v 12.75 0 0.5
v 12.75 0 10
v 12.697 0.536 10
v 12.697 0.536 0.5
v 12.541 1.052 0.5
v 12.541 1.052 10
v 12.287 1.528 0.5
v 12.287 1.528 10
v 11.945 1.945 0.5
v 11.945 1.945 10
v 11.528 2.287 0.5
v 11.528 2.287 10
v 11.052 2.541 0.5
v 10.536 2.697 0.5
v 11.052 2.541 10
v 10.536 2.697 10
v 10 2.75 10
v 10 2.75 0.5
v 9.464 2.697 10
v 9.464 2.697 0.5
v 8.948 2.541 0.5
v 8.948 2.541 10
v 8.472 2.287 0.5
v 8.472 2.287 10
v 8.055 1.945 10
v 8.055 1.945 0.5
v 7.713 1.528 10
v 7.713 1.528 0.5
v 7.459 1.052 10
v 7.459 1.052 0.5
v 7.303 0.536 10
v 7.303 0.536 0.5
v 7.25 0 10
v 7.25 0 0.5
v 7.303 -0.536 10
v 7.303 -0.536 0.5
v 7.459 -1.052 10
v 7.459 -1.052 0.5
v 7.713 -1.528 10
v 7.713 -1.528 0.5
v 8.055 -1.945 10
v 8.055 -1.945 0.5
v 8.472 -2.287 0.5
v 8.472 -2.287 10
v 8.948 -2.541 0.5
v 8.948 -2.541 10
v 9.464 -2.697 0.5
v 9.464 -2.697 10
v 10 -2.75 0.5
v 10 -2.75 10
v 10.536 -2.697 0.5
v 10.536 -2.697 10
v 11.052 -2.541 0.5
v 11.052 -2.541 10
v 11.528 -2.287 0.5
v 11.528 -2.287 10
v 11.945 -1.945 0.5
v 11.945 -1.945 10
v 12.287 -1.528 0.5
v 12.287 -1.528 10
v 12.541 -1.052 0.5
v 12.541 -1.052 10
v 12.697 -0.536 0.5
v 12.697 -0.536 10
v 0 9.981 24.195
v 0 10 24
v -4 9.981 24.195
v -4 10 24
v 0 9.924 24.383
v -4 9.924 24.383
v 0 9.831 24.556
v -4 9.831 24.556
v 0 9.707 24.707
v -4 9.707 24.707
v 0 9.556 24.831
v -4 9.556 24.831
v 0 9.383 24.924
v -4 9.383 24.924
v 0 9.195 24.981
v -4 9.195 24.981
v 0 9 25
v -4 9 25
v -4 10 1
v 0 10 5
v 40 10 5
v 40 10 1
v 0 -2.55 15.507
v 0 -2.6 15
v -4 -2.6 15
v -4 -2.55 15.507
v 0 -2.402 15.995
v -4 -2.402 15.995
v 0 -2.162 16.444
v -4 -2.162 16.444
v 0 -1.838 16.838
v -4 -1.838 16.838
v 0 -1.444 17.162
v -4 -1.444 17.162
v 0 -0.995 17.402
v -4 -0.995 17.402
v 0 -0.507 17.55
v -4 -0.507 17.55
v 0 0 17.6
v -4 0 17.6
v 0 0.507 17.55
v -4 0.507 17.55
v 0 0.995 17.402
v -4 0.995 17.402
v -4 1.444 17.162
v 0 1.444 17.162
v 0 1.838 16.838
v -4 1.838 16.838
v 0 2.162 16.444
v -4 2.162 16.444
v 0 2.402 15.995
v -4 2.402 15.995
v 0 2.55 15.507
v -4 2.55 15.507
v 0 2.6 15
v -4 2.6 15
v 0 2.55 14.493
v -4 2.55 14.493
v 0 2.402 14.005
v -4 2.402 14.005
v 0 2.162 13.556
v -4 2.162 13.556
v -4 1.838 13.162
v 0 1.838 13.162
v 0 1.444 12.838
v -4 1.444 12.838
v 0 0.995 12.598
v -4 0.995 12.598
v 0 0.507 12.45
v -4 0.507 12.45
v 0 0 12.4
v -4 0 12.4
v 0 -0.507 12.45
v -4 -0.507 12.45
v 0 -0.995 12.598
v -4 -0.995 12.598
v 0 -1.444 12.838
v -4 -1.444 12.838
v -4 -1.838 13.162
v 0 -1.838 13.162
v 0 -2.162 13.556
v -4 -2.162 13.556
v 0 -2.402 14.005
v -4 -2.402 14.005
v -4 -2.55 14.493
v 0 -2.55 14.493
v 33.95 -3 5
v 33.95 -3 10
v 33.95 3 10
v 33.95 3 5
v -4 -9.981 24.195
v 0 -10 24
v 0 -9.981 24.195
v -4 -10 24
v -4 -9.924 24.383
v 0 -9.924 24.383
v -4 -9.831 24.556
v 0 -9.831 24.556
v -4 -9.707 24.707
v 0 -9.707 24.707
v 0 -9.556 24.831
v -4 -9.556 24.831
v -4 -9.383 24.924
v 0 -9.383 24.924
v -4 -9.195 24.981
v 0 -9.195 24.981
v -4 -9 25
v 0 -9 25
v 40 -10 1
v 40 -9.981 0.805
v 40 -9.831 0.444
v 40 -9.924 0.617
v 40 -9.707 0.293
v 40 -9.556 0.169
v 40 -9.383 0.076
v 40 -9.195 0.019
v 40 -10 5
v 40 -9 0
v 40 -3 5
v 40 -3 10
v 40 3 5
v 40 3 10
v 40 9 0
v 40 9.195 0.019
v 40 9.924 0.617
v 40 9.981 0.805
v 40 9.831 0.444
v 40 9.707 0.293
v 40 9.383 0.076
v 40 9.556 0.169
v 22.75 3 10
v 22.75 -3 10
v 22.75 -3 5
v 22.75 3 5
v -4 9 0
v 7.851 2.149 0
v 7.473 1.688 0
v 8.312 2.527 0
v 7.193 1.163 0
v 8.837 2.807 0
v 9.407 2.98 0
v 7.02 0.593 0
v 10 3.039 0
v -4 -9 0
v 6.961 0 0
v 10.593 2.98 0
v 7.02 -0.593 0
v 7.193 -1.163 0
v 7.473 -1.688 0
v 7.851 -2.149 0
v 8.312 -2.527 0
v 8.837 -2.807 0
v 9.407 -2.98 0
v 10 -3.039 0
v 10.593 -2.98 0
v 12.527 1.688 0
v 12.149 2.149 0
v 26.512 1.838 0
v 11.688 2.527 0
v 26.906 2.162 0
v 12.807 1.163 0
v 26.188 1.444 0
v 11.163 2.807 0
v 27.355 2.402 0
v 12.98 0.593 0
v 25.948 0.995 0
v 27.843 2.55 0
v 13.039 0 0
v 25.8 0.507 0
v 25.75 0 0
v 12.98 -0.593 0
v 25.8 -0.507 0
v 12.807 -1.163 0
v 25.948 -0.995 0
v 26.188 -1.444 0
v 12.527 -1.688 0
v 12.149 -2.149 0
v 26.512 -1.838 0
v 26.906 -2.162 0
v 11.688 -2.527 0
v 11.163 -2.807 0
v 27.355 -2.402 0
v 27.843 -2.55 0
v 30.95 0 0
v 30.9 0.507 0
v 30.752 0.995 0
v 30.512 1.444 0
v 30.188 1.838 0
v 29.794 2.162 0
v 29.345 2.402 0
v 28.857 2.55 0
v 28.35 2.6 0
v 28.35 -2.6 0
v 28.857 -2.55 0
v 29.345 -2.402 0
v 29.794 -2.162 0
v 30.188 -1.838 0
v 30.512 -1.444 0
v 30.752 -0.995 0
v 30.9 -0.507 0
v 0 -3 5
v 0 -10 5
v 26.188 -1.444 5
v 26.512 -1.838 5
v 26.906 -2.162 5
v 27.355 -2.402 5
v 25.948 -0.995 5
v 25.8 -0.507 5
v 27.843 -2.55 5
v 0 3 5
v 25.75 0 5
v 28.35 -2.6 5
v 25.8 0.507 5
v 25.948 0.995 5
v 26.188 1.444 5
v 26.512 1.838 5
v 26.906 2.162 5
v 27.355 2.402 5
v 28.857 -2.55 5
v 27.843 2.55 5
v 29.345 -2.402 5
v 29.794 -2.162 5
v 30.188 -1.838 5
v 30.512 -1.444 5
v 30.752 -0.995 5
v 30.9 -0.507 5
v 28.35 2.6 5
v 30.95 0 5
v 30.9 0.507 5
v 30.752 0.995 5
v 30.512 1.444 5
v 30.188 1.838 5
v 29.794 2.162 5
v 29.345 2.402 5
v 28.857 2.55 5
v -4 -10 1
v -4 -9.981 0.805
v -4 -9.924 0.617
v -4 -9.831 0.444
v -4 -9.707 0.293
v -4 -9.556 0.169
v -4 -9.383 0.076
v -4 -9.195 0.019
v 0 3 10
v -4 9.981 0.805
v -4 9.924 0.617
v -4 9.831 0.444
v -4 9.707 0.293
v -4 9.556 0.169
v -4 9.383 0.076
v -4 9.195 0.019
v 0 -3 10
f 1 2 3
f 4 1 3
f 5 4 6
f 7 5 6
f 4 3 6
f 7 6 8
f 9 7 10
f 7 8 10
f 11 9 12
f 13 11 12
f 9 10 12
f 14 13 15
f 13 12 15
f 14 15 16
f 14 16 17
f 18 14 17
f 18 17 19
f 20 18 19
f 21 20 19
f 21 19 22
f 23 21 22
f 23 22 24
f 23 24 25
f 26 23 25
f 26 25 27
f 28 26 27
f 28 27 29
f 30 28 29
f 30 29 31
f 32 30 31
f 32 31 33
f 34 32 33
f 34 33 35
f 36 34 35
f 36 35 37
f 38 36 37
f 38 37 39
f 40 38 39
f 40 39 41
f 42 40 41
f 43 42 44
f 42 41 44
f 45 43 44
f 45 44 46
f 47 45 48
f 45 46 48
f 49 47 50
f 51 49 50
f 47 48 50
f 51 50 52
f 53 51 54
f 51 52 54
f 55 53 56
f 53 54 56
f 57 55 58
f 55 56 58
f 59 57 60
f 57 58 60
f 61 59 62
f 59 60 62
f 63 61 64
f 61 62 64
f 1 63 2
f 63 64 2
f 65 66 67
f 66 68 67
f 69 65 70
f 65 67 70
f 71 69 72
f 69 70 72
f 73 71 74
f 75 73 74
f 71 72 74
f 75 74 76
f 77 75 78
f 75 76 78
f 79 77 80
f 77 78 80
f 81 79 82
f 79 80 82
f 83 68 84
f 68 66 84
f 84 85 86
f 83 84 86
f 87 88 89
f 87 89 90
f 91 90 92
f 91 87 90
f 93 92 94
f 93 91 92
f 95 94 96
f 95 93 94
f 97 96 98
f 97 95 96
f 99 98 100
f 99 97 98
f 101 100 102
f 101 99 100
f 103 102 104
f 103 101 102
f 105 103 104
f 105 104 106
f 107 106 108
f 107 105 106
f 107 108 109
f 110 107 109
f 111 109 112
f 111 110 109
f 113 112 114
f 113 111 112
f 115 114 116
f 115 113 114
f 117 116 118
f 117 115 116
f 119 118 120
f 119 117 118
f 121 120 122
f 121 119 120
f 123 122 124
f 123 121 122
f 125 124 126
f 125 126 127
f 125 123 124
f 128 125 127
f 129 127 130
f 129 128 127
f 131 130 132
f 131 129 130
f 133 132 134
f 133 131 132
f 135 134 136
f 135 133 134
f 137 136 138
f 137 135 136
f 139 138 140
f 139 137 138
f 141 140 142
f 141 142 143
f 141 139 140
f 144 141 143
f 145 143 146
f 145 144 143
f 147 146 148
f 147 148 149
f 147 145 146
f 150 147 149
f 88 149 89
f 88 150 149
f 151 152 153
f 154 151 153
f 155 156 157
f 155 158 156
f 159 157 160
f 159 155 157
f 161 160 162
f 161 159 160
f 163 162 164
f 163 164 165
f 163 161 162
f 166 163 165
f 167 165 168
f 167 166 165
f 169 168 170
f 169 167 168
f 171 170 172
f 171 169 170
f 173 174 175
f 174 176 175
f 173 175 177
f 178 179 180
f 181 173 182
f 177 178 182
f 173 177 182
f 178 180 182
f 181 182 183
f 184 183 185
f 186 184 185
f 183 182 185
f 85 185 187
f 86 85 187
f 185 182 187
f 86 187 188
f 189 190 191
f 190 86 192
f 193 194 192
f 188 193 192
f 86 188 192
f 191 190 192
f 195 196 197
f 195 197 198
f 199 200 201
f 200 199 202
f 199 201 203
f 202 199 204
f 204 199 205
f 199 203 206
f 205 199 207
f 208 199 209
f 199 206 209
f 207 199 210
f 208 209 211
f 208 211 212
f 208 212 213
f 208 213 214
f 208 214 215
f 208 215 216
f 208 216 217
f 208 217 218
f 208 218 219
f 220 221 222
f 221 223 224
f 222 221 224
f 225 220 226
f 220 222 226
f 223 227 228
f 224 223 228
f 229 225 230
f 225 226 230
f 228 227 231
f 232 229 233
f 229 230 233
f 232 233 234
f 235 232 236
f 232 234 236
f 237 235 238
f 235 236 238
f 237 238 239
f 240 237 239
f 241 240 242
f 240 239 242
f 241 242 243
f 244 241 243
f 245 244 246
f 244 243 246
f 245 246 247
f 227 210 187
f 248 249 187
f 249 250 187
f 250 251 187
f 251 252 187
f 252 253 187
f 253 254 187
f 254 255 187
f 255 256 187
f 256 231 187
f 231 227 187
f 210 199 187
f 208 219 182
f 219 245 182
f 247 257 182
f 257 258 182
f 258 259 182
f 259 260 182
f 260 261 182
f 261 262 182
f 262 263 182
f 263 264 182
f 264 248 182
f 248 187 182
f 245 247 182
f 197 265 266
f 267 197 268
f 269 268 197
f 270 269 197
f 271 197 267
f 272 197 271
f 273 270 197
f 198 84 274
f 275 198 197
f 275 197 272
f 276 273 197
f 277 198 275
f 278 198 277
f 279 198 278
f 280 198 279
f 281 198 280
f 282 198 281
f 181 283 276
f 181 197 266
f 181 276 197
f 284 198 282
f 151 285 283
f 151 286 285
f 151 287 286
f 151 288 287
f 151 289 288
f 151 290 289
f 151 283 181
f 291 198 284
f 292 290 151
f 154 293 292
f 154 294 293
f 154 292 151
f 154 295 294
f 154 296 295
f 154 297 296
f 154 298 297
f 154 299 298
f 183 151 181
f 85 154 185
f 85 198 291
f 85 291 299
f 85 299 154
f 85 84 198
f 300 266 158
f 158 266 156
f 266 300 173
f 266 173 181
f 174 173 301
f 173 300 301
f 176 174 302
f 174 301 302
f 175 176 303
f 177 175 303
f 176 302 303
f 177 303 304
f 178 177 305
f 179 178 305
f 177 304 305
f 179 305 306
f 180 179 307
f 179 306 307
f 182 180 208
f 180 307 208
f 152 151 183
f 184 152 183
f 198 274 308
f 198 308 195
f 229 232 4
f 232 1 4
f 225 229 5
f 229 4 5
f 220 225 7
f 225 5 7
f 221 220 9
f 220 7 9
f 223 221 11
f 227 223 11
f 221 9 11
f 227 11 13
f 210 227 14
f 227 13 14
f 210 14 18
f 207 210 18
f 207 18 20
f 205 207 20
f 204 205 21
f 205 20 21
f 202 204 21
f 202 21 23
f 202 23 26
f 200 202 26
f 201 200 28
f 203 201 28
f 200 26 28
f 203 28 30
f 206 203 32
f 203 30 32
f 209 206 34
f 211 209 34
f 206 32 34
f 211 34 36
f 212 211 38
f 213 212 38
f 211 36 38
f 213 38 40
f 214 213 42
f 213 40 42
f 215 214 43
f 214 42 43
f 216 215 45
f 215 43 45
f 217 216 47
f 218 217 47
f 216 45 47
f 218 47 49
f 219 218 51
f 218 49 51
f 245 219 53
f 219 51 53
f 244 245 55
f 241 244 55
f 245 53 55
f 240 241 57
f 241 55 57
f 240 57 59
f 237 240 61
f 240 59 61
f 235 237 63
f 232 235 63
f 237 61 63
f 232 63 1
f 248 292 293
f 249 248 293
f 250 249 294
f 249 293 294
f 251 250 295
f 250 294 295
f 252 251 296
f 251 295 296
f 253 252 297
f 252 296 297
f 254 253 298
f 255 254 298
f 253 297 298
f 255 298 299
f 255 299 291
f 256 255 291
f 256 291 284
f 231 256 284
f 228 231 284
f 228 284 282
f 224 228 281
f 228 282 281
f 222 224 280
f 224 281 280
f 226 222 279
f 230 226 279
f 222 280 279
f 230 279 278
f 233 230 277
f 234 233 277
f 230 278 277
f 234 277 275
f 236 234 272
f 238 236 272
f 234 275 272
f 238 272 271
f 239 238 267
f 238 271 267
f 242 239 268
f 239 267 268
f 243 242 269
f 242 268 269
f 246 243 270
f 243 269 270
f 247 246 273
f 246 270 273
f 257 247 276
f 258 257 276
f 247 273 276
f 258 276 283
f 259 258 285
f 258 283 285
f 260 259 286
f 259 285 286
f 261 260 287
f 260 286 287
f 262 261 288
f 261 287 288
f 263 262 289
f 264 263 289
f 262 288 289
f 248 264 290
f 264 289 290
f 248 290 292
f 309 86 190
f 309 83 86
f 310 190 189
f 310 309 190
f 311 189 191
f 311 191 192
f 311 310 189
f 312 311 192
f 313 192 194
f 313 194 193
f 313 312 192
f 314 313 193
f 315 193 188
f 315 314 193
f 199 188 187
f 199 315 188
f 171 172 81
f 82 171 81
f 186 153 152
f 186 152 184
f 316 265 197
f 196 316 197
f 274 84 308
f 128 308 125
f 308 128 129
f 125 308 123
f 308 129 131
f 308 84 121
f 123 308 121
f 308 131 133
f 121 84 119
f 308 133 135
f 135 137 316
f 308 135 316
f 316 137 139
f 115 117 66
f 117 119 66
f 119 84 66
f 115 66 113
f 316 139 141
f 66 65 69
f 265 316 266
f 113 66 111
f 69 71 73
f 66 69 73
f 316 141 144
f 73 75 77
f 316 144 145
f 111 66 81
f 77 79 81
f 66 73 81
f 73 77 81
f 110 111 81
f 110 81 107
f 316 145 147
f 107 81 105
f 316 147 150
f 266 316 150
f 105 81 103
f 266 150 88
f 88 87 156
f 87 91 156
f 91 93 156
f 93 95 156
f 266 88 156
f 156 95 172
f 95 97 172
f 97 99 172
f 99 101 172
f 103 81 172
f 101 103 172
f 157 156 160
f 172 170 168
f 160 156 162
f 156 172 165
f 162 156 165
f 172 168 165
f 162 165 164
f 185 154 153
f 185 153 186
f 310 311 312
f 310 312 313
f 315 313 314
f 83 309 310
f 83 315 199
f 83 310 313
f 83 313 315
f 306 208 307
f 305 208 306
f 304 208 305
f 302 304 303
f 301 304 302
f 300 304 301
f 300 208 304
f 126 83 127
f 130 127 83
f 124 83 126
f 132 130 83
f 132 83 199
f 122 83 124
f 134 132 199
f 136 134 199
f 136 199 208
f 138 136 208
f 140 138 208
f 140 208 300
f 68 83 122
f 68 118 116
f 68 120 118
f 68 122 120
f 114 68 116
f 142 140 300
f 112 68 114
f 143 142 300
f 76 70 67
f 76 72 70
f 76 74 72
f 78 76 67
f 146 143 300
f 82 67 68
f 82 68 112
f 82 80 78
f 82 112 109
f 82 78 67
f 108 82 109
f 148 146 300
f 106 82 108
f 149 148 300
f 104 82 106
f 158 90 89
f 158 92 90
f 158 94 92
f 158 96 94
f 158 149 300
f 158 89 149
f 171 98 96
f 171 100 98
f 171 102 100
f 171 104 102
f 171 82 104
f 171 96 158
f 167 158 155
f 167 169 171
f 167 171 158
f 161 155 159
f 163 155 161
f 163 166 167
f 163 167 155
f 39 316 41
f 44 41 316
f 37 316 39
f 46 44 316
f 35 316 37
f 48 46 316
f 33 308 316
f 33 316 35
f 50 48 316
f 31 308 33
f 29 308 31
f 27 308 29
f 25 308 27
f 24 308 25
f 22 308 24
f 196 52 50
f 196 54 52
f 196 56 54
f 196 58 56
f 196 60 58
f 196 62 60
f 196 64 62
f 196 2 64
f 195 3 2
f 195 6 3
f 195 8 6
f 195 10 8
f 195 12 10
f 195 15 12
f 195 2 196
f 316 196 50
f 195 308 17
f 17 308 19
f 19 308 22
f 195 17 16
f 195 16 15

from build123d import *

# Parameters (mm, degrees)
F0_W      = 40
F0_H      = 20
F1_DEPTH  = 5
F2_W      = 40
F2_H      = 6
F3_DEPTH  = 5
F4_R      = 2.75
F5_DEPTH  = 25
F6_W      = 11.2
F6_H      = 6
F7_DEPTH  = 5
F8_R      = 2.6
F9_DEPTH  = 5
F10_R     = 2.6
F11_DEPTH = 4
F12_R     = 1


# Not quite as in the source:
# - a fillet or chamfer that OpenCascade refuses, or shapes differently, is made with other operations: its cross-section is extruded or revolved along the edge and cut away or added
# - a feature names something its author has since deleted; it is built from what else it names


with BuildPart() as f1:
    # F0 (on Top) → F1 (new body)
    with BuildSketch(Plane.XY):
        with Locations((20, 0)):
            Rectangle(F0_W, F0_H)
    extrude(amount=F1_DEPTH)

    # F2 (on face) → F3 (join)
    with BuildSketch(Plane.XY.offset(5)):
        with Locations((20, 0)):
            Rectangle(F2_W, F2_H)
    extrude(amount=F3_DEPTH)

    # F4 (on face) → F5 (cut)
    with BuildSketch(Plane.XY.offset(10)):
        with Locations((10, 0)):
            Circle(F4_R)
    extrude(amount=-F5_DEPTH, mode=Mode.SUBTRACT)

    # F6 (on face) → F7 (cut, through all)
    with BuildSketch(Plane.XY.offset(10)):
        with Locations((28.35, 0)):
            Rectangle(F6_W, F6_H)
    extrude(amount=-F7_DEPTH, mode=Mode.SUBTRACT)

    # F8 (on face) → F9 (cut, through all)
    with BuildSketch(Plane.XY.offset(5)):
        with Locations((28.35, 0)):
            Circle(F8_R)
    extrude(amount=-F9_DEPTH, mode=Mode.SUBTRACT)

    # F10 (on face) → F11 (join)
    with BuildSketch(Plane(origin=(0, 0, 0), x_dir=(0, -1, 0), z_dir=(-1, 0, 0))):
        Polygon((-10, 25), (-10, 5), (-3, 5), (-3, 10), (3, 10), (3, 5), (10, 5), (10, 25), align=None)
        with Locations((0, 15)):
            Circle(F10_R, mode=Mode.SUBTRACT)
        Polygon((-10, 5), (-10, 0), (10, 0), (10, 5), (3, 5), (3, 10), (-3, 10), (-3, 5), align=None)
    extrude(amount=F11_DEPTH)

    # F12
    f12_edges = [f1.edges().sort_by_distance(p)[0] for p in [
        (-2, -10, 25),
        (-2, 10, 25),
        (18, -10, 0),
        (18, 10, 0),
    ]]
    fillet(f12_edges, radius=F12_R)

    # F13: chamfer of 0.5 x 0.2886751346 on 1 edges, made by hand

    # F13_s1 → F13_t2 (revolve, cut)
    with BuildSketch(Plane.XZ):
        Polygon((13.0386751346, 0), (12.75, 0.5), (12.75, 0), align=None)
    revolve(axis=Axis((10, 0, 0), (0, 0, 1)), mode=Mode.SUBTRACT)


solid = f1.part
